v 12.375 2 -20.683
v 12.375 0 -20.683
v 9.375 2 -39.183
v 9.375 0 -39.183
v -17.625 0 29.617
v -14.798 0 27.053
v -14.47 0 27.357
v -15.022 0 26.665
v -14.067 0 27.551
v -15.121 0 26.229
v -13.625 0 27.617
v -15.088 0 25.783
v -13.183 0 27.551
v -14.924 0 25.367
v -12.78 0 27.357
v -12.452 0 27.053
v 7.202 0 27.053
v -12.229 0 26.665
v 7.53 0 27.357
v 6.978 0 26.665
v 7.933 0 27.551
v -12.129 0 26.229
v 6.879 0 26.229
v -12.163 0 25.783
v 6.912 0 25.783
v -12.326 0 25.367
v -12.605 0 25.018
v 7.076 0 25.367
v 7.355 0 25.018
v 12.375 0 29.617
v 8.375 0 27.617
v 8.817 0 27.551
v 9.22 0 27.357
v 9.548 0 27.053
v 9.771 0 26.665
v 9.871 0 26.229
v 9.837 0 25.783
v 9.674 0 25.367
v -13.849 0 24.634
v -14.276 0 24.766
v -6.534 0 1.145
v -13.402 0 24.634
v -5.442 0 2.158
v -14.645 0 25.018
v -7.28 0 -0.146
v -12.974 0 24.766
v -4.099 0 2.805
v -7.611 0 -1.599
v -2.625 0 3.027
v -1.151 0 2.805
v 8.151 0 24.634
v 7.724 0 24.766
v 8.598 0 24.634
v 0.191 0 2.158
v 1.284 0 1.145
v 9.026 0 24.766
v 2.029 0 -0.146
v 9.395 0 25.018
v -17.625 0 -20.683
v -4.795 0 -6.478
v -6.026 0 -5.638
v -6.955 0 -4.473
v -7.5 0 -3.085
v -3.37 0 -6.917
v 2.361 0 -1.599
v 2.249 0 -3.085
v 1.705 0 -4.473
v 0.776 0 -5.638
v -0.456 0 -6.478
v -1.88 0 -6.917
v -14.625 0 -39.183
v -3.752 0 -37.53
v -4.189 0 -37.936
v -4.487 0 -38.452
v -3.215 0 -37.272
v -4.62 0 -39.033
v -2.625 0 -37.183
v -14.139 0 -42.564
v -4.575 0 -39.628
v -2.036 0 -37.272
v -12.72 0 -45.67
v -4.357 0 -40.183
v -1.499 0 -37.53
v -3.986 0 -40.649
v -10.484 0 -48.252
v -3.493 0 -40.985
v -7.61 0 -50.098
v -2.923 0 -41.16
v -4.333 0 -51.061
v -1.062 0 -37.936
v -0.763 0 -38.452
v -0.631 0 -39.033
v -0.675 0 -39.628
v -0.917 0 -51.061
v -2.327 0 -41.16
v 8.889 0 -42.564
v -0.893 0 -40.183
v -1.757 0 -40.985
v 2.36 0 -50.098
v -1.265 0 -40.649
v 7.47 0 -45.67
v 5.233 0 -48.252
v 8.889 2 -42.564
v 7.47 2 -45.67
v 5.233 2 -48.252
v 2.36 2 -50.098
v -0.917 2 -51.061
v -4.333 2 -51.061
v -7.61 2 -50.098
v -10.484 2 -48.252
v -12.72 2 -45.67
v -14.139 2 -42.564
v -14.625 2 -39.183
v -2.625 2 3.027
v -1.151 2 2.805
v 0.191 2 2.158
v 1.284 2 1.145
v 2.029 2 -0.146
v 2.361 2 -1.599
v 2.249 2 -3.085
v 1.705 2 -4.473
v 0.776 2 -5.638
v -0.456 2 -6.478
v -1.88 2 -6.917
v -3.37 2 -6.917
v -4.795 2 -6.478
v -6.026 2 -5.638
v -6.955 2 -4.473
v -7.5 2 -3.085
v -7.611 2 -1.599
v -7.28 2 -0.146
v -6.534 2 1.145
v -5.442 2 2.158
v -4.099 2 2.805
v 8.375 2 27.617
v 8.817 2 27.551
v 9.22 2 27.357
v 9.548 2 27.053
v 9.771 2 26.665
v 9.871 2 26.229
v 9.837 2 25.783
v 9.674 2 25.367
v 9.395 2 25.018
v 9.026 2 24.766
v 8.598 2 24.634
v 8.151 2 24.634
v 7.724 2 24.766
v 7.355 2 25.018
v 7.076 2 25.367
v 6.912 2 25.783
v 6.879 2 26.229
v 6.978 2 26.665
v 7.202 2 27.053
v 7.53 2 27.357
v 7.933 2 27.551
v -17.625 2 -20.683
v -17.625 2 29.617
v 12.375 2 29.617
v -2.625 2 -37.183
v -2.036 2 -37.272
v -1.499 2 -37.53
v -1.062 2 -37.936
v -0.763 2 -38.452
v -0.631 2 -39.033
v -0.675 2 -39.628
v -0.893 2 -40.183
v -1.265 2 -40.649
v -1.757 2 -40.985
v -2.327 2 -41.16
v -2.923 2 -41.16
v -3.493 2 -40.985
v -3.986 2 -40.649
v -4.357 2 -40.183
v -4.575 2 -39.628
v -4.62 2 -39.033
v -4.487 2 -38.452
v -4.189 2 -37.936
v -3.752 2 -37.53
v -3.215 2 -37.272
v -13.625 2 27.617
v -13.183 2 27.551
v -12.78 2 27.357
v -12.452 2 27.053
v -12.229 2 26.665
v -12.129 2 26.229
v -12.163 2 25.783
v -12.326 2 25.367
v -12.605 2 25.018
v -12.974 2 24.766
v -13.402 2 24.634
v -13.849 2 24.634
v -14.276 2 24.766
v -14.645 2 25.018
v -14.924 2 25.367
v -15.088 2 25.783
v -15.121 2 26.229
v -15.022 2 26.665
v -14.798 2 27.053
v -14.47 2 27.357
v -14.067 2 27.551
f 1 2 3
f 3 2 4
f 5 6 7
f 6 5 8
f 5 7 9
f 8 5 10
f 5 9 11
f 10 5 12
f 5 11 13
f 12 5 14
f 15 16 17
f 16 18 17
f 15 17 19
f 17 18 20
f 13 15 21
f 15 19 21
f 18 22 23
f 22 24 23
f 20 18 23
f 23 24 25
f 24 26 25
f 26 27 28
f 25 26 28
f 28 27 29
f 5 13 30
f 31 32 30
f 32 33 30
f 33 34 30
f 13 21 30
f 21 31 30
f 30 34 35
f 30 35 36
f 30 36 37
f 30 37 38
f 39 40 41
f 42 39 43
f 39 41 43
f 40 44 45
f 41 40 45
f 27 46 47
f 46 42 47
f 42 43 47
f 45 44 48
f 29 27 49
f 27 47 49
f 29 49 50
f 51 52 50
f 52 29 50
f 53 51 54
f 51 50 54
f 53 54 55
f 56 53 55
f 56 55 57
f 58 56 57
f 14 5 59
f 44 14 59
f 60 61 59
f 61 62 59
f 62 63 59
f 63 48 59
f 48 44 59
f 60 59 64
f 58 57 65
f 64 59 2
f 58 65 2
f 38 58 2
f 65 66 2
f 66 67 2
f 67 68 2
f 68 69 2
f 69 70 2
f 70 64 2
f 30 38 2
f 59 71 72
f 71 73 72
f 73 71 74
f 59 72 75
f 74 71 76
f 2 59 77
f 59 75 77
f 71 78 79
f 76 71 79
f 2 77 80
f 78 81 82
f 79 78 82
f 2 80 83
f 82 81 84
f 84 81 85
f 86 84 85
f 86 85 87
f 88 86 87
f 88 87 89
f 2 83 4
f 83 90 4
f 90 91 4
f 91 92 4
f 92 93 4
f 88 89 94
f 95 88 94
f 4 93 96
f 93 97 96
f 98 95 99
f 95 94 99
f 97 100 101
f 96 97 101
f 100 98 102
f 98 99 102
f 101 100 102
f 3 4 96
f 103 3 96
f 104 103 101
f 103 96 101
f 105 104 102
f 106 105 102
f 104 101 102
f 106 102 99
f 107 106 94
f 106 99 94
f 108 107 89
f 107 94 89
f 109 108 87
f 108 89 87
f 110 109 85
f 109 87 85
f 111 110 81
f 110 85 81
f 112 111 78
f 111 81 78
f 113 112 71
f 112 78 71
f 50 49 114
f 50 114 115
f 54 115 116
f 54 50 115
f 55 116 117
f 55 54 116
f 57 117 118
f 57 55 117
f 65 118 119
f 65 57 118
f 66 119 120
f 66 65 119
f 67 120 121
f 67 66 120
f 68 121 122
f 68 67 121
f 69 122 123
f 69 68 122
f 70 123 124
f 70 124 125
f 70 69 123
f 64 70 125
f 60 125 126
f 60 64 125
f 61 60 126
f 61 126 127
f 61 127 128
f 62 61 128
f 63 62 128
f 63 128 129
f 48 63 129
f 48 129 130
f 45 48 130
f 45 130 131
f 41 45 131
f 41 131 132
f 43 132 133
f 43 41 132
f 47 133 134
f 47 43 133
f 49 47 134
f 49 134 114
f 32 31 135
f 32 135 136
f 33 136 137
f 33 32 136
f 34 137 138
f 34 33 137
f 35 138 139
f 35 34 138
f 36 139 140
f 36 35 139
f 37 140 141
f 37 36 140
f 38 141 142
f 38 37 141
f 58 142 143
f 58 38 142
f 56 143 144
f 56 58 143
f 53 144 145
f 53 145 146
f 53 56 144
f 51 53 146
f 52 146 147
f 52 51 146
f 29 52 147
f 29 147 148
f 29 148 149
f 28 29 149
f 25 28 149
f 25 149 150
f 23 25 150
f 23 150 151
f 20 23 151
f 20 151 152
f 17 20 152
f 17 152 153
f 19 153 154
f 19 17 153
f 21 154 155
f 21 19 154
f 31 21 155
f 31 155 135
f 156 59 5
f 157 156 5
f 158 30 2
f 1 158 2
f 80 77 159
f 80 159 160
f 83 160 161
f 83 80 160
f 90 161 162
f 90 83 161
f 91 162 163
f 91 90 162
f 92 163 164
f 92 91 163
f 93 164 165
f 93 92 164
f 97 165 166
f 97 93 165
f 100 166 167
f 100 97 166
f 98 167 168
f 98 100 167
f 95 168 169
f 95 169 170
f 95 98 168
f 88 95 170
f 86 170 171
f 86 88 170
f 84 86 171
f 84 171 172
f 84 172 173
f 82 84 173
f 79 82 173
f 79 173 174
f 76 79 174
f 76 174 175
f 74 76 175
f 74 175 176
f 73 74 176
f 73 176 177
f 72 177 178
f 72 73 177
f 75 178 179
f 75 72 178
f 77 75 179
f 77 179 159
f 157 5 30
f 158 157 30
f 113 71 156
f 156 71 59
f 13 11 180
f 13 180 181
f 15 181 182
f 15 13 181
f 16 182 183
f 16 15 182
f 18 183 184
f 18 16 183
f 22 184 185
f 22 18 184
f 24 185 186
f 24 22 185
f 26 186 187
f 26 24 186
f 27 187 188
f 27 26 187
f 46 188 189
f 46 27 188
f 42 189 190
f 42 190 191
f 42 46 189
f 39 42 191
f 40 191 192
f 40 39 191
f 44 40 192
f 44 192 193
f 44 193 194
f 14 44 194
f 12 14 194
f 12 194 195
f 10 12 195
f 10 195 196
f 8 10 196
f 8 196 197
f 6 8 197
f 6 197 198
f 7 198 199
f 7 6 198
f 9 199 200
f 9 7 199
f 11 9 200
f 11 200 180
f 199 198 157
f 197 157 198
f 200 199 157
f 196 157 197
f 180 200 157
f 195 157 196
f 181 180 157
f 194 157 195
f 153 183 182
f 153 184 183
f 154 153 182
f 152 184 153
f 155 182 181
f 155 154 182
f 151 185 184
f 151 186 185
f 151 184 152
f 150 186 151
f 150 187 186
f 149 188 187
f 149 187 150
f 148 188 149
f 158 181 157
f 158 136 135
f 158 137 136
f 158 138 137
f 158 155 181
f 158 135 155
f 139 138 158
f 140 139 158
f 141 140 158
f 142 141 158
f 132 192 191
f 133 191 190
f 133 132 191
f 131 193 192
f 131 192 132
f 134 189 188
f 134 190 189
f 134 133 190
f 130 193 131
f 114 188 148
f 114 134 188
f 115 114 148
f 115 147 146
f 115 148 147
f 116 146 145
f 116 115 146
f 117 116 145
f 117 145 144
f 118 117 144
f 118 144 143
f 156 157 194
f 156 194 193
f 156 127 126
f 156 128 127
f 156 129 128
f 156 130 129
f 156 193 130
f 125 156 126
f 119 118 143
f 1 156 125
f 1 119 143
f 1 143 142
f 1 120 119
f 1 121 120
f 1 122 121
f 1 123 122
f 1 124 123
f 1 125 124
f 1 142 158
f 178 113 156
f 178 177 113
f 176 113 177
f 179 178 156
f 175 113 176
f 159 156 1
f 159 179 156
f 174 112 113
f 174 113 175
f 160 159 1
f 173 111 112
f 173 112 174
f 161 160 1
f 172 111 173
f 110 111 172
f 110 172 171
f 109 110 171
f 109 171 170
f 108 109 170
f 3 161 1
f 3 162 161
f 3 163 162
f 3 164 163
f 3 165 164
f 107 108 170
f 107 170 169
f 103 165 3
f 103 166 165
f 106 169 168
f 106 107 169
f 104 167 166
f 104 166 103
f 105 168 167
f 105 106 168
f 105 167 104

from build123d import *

# Parameters (mm, degrees)
SKETCH_1_R      = 1.5
SKETCH_1_R_2    = 2
SKETCH_1_R_3    = 5
EXTRUDE_1_DEPTH = 2


with BuildPart() as part:
    # Эскиз1 → Бобышка-Вытянуть1 (new body)
    with BuildSketch(Plane(origin=(0, 0, 0), x_dir=(1, 0, 0), z_dir=(0, 1, 0))):
        with BuildLine():
            Line((12.374772085, -29.617278809), (12.374772085, 20.682721191))
            Line((12.374772085, 20.682721191), (9.374772085, 39.182721191))
            ThreePointArc((9.374772085, 39.182721191), (-2.625227915, 51.182721191), (-14.625227915, 39.182721191))
            Line((-14.625227915, 39.182721191), (-17.625227915, 20.682721191))
            Line((-17.625227915, 20.682721191), (-17.625227915, -29.617278809))
            Line((-17.625227915, -29.617278809), (-10.625227915, -29.617278809))
            Line((-10.625227915, -29.617278809), (5.374772085, -29.617278809))
            Line((5.374772085, -29.617278809), (12.374772085, -29.617278809))
        make_face()
        with Locations(Location((-13.625227915, -26.117278809, 0), (0, 0, 270))):
            Circle(SKETCH_1_R, mode=Mode.SUBTRACT)
        with Locations(Location((8.374772085, -26.117278809, 0), (0, 0, 270))):
            Circle(SKETCH_1_R, mode=Mode.SUBTRACT)
        with Locations(Location((-2.625227915, 39.182721191, 0), (0, 0, 270))):
            Circle(SKETCH_1_R_2, mode=Mode.SUBTRACT)
        with Locations(Location((-2.625227915, 1.972721191, 0), (0, 0, 270))):
            Circle(SKETCH_1_R_3, mode=Mode.SUBTRACT)
    extrude(amount=EXTRUDE_1_DEPTH)


solid = part.part
